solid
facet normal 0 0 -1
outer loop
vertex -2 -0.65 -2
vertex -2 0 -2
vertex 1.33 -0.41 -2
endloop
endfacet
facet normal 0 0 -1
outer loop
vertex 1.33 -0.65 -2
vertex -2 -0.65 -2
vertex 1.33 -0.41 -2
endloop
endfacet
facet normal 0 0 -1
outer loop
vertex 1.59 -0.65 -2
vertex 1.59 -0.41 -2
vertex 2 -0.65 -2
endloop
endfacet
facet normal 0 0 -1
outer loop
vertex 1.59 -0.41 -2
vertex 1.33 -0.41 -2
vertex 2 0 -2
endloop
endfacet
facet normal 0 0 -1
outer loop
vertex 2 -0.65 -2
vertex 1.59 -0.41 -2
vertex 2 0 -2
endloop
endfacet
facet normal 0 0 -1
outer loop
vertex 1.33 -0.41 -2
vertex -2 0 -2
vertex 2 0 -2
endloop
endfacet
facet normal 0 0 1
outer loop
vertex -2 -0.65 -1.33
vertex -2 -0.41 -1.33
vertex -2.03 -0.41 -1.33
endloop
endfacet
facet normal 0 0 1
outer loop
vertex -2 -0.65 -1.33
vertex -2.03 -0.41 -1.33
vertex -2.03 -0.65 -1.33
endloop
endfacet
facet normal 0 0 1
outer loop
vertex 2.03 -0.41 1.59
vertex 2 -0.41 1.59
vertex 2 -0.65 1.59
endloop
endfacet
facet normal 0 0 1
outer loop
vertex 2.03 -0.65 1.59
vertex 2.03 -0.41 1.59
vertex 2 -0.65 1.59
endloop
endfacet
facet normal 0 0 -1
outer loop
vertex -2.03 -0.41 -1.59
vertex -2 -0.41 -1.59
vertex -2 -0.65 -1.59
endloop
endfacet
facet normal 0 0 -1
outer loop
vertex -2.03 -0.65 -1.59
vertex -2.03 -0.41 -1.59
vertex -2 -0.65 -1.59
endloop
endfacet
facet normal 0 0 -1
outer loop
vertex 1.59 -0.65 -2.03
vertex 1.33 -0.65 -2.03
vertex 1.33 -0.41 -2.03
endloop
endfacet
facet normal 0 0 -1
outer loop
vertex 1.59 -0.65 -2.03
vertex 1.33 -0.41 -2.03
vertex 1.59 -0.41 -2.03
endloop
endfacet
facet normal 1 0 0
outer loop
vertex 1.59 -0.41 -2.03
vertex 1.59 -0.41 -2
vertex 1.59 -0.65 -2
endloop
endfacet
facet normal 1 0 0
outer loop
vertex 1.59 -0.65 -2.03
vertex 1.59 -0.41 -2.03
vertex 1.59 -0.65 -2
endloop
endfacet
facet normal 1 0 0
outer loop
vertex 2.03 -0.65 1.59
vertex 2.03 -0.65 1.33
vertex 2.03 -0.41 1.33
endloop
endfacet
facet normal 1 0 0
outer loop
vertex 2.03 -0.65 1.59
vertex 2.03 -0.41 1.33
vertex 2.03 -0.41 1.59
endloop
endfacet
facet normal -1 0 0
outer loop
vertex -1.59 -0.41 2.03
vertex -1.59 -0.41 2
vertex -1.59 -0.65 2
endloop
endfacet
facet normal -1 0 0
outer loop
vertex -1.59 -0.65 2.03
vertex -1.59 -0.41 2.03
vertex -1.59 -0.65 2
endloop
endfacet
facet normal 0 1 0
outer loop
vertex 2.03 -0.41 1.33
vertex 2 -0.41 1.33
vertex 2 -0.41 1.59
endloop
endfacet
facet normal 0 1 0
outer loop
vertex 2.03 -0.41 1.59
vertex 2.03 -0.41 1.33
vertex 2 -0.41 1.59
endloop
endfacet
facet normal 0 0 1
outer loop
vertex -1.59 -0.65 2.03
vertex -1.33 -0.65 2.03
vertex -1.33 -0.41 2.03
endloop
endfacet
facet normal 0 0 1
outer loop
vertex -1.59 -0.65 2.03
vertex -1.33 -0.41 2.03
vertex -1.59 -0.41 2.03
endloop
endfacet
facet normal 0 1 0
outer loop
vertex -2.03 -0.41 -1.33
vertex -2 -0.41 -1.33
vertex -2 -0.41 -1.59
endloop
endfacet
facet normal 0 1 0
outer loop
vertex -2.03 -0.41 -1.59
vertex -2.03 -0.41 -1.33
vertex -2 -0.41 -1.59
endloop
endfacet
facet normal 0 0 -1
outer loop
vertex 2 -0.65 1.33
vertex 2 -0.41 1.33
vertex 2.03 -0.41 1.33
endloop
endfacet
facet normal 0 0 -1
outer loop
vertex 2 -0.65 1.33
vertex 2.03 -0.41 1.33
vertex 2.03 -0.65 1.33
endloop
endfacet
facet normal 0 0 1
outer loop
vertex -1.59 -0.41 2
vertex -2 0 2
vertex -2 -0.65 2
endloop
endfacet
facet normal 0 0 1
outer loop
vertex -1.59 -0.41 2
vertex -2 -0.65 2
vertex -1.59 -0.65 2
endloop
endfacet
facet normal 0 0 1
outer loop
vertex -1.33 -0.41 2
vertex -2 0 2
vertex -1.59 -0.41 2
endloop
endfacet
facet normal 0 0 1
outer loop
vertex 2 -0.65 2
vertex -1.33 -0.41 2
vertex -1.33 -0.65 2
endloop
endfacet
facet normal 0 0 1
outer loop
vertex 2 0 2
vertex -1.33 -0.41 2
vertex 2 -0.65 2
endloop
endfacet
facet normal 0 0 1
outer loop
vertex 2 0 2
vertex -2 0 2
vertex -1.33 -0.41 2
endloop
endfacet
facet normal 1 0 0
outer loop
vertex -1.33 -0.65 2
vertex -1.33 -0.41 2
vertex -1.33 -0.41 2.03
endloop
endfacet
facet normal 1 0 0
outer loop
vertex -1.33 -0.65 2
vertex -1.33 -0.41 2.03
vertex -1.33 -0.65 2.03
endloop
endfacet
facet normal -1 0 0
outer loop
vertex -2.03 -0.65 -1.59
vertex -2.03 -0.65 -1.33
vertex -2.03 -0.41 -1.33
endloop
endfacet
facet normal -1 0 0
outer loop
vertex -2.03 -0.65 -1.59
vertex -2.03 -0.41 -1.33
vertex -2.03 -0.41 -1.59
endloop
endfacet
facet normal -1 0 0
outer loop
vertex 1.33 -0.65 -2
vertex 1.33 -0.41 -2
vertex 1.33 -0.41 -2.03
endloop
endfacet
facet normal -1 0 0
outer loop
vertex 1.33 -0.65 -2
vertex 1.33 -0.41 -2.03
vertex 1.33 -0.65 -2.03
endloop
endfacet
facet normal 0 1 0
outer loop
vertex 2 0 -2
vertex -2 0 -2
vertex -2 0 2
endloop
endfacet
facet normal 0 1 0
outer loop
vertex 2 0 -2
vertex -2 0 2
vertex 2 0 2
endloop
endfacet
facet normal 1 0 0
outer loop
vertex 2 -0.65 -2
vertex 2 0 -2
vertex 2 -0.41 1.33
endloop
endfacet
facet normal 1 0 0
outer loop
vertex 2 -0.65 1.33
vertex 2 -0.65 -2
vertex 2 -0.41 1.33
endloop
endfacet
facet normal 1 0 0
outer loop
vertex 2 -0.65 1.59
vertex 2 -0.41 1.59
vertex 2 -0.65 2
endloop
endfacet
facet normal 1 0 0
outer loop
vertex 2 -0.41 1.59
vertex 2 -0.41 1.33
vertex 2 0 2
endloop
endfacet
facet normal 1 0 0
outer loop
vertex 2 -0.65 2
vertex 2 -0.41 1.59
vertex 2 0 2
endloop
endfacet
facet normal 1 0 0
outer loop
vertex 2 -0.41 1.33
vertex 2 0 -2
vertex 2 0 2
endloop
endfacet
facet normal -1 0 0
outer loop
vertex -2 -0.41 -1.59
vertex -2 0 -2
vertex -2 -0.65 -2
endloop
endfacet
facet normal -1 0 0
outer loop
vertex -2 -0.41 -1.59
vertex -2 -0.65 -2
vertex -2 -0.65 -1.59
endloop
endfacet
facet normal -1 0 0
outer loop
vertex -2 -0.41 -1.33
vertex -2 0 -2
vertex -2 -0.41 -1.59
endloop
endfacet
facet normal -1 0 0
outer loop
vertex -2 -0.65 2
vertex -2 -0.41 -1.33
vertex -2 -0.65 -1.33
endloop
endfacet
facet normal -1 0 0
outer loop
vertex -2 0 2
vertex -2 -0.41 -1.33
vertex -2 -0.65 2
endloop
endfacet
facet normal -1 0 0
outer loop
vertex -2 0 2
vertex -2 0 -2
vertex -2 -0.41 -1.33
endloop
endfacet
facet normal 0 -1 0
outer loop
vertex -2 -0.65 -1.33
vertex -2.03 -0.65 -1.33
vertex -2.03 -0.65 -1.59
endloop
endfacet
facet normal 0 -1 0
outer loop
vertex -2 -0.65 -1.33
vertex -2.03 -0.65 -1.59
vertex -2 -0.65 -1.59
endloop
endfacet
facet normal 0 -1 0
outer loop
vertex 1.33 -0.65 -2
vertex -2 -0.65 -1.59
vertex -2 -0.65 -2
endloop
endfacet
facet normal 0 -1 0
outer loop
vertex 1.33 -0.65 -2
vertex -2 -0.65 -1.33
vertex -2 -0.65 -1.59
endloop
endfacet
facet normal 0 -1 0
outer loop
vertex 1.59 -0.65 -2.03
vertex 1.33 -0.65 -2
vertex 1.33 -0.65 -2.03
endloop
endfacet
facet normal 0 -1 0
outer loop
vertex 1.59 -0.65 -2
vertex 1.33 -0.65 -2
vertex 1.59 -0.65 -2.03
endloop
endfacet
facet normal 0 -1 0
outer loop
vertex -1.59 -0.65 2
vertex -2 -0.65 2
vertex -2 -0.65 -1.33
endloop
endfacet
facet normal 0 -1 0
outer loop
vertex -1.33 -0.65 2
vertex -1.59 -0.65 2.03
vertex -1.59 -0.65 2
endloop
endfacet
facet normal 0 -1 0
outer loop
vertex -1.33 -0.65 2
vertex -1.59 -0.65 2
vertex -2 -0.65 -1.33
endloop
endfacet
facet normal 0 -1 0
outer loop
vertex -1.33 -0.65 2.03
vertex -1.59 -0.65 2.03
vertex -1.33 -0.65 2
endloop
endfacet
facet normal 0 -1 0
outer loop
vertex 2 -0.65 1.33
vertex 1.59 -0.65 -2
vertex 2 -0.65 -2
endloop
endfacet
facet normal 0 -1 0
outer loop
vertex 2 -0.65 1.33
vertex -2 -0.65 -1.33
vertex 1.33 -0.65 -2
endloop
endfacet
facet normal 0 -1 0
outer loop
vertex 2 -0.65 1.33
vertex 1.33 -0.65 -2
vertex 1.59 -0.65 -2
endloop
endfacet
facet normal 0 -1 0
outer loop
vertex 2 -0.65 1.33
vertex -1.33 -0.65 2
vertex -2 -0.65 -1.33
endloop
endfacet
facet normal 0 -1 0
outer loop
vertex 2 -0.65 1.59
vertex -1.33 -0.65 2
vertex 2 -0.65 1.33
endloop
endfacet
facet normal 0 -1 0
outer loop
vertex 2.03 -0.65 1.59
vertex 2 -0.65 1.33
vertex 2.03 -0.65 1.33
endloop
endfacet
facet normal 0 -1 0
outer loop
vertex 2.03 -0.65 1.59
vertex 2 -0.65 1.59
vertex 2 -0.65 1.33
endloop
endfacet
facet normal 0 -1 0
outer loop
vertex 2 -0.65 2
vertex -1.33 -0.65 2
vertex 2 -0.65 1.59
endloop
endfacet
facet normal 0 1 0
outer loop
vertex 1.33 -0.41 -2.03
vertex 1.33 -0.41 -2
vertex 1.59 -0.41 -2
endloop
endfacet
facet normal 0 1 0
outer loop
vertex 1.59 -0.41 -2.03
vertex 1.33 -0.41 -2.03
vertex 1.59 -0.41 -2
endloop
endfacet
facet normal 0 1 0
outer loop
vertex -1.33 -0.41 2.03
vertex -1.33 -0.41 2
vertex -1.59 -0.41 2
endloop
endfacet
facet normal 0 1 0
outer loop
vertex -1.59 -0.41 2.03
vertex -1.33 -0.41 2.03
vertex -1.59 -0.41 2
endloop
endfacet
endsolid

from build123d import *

# Parameters (mm, degrees)
SKETCH_W     = 4
SKETCH_H     = 4
PAD_DEPTH    = 0.65
SKETCH001_W  = 3
SKETCH001_H  = 3
POCKET_DEPTH = 0.15
SKETCH002_W  = 3
SKETCH002_H  = 3
PAD001_DEPTH = 0.15
SKETCH003_W  = 0.26
SKETCH003_H  = 0.24
PAD002_DEPTH = 0.03
SKETCH004_W  = 0.26
SKETCH004_H  = 0.24
PAD003_DEPTH = 0.03
SKETCH005_W  = 0.26
SKETCH005_H  = 0.24
PAD004_DEPTH = 0.03
SKETCH006_W  = 0.26
SKETCH006_H  = 0.24
PAD005_DEPTH = 0.03


with BuildPart() as part:
    # Sketch → Pad (new body)
    with BuildSketch(Plane.XZ):
        Rectangle(SKETCH_W, SKETCH_H)
    extrude(amount=PAD_DEPTH)

    # Sketch001 (on Face5 of Pad) → Pocket (cut)
    with BuildSketch(Plane(origin=(0, 0, 0), x_dir=(1, 0, 0), z_dir=(0, 1, 0))):
        Rectangle(SKETCH001_W, SKETCH001_H)
    extrude(amount=-POCKET_DEPTH, mode=Mode.SUBTRACT)

    # Sketch002 (on Face11 of Pocket) → Pad001 (join)
    with BuildSketch(Plane(origin=(0, -0.15, 0), x_dir=(1, 0, 0), z_dir=(0, 1, 0))):
        Rectangle(SKETCH002_W, SKETCH002_H)
    extrude(amount=PAD001_DEPTH)

    # Sketch003 (on Face1 of Pad001) → Pad002 (join)
    with BuildSketch(Plane(origin=(0, 0, 2), x_dir=(-1, 0, 0), z_dir=(0, 0, 1))):
        with Locations((1.46, 0.53)):
            Rectangle(SKETCH003_W, SKETCH003_H)
    extrude(amount=PAD002_DEPTH)

    # Sketch004 (on Face3 of Pad002) → Pad003 (join)
    with BuildSketch(Plane(origin=(2, 0, 0), x_dir=(0, 0, 1), z_dir=(1, 0, 0))):
        with Locations((1.46, 0.53)):
            Rectangle(SKETCH004_W, SKETCH004_H)
    extrude(amount=PAD003_DEPTH)

    # Sketch005 (on Face9 of Pad003) → Pad004 (join)
    with BuildSketch(Plane(origin=(0, 0, -2), x_dir=(1, 0, 0), z_dir=(0, 0, -1))):
        with Locations((1.46, 0.53)):
            Rectangle(SKETCH005_W, SKETCH005_H)
    extrude(amount=PAD004_DEPTH)

    # Sketch006 (on Face8 of Pad004) → Pad005 (join)
    with BuildSketch(Plane(origin=(-2, 0, 0), x_dir=(0, 0, -1), z_dir=(-1, 0, 0))):
        with Locations((1.46, 0.53)):
            Rectangle(SKETCH006_W, SKETCH006_H)
    extrude(amount=PAD005_DEPTH)


solid = part.part
